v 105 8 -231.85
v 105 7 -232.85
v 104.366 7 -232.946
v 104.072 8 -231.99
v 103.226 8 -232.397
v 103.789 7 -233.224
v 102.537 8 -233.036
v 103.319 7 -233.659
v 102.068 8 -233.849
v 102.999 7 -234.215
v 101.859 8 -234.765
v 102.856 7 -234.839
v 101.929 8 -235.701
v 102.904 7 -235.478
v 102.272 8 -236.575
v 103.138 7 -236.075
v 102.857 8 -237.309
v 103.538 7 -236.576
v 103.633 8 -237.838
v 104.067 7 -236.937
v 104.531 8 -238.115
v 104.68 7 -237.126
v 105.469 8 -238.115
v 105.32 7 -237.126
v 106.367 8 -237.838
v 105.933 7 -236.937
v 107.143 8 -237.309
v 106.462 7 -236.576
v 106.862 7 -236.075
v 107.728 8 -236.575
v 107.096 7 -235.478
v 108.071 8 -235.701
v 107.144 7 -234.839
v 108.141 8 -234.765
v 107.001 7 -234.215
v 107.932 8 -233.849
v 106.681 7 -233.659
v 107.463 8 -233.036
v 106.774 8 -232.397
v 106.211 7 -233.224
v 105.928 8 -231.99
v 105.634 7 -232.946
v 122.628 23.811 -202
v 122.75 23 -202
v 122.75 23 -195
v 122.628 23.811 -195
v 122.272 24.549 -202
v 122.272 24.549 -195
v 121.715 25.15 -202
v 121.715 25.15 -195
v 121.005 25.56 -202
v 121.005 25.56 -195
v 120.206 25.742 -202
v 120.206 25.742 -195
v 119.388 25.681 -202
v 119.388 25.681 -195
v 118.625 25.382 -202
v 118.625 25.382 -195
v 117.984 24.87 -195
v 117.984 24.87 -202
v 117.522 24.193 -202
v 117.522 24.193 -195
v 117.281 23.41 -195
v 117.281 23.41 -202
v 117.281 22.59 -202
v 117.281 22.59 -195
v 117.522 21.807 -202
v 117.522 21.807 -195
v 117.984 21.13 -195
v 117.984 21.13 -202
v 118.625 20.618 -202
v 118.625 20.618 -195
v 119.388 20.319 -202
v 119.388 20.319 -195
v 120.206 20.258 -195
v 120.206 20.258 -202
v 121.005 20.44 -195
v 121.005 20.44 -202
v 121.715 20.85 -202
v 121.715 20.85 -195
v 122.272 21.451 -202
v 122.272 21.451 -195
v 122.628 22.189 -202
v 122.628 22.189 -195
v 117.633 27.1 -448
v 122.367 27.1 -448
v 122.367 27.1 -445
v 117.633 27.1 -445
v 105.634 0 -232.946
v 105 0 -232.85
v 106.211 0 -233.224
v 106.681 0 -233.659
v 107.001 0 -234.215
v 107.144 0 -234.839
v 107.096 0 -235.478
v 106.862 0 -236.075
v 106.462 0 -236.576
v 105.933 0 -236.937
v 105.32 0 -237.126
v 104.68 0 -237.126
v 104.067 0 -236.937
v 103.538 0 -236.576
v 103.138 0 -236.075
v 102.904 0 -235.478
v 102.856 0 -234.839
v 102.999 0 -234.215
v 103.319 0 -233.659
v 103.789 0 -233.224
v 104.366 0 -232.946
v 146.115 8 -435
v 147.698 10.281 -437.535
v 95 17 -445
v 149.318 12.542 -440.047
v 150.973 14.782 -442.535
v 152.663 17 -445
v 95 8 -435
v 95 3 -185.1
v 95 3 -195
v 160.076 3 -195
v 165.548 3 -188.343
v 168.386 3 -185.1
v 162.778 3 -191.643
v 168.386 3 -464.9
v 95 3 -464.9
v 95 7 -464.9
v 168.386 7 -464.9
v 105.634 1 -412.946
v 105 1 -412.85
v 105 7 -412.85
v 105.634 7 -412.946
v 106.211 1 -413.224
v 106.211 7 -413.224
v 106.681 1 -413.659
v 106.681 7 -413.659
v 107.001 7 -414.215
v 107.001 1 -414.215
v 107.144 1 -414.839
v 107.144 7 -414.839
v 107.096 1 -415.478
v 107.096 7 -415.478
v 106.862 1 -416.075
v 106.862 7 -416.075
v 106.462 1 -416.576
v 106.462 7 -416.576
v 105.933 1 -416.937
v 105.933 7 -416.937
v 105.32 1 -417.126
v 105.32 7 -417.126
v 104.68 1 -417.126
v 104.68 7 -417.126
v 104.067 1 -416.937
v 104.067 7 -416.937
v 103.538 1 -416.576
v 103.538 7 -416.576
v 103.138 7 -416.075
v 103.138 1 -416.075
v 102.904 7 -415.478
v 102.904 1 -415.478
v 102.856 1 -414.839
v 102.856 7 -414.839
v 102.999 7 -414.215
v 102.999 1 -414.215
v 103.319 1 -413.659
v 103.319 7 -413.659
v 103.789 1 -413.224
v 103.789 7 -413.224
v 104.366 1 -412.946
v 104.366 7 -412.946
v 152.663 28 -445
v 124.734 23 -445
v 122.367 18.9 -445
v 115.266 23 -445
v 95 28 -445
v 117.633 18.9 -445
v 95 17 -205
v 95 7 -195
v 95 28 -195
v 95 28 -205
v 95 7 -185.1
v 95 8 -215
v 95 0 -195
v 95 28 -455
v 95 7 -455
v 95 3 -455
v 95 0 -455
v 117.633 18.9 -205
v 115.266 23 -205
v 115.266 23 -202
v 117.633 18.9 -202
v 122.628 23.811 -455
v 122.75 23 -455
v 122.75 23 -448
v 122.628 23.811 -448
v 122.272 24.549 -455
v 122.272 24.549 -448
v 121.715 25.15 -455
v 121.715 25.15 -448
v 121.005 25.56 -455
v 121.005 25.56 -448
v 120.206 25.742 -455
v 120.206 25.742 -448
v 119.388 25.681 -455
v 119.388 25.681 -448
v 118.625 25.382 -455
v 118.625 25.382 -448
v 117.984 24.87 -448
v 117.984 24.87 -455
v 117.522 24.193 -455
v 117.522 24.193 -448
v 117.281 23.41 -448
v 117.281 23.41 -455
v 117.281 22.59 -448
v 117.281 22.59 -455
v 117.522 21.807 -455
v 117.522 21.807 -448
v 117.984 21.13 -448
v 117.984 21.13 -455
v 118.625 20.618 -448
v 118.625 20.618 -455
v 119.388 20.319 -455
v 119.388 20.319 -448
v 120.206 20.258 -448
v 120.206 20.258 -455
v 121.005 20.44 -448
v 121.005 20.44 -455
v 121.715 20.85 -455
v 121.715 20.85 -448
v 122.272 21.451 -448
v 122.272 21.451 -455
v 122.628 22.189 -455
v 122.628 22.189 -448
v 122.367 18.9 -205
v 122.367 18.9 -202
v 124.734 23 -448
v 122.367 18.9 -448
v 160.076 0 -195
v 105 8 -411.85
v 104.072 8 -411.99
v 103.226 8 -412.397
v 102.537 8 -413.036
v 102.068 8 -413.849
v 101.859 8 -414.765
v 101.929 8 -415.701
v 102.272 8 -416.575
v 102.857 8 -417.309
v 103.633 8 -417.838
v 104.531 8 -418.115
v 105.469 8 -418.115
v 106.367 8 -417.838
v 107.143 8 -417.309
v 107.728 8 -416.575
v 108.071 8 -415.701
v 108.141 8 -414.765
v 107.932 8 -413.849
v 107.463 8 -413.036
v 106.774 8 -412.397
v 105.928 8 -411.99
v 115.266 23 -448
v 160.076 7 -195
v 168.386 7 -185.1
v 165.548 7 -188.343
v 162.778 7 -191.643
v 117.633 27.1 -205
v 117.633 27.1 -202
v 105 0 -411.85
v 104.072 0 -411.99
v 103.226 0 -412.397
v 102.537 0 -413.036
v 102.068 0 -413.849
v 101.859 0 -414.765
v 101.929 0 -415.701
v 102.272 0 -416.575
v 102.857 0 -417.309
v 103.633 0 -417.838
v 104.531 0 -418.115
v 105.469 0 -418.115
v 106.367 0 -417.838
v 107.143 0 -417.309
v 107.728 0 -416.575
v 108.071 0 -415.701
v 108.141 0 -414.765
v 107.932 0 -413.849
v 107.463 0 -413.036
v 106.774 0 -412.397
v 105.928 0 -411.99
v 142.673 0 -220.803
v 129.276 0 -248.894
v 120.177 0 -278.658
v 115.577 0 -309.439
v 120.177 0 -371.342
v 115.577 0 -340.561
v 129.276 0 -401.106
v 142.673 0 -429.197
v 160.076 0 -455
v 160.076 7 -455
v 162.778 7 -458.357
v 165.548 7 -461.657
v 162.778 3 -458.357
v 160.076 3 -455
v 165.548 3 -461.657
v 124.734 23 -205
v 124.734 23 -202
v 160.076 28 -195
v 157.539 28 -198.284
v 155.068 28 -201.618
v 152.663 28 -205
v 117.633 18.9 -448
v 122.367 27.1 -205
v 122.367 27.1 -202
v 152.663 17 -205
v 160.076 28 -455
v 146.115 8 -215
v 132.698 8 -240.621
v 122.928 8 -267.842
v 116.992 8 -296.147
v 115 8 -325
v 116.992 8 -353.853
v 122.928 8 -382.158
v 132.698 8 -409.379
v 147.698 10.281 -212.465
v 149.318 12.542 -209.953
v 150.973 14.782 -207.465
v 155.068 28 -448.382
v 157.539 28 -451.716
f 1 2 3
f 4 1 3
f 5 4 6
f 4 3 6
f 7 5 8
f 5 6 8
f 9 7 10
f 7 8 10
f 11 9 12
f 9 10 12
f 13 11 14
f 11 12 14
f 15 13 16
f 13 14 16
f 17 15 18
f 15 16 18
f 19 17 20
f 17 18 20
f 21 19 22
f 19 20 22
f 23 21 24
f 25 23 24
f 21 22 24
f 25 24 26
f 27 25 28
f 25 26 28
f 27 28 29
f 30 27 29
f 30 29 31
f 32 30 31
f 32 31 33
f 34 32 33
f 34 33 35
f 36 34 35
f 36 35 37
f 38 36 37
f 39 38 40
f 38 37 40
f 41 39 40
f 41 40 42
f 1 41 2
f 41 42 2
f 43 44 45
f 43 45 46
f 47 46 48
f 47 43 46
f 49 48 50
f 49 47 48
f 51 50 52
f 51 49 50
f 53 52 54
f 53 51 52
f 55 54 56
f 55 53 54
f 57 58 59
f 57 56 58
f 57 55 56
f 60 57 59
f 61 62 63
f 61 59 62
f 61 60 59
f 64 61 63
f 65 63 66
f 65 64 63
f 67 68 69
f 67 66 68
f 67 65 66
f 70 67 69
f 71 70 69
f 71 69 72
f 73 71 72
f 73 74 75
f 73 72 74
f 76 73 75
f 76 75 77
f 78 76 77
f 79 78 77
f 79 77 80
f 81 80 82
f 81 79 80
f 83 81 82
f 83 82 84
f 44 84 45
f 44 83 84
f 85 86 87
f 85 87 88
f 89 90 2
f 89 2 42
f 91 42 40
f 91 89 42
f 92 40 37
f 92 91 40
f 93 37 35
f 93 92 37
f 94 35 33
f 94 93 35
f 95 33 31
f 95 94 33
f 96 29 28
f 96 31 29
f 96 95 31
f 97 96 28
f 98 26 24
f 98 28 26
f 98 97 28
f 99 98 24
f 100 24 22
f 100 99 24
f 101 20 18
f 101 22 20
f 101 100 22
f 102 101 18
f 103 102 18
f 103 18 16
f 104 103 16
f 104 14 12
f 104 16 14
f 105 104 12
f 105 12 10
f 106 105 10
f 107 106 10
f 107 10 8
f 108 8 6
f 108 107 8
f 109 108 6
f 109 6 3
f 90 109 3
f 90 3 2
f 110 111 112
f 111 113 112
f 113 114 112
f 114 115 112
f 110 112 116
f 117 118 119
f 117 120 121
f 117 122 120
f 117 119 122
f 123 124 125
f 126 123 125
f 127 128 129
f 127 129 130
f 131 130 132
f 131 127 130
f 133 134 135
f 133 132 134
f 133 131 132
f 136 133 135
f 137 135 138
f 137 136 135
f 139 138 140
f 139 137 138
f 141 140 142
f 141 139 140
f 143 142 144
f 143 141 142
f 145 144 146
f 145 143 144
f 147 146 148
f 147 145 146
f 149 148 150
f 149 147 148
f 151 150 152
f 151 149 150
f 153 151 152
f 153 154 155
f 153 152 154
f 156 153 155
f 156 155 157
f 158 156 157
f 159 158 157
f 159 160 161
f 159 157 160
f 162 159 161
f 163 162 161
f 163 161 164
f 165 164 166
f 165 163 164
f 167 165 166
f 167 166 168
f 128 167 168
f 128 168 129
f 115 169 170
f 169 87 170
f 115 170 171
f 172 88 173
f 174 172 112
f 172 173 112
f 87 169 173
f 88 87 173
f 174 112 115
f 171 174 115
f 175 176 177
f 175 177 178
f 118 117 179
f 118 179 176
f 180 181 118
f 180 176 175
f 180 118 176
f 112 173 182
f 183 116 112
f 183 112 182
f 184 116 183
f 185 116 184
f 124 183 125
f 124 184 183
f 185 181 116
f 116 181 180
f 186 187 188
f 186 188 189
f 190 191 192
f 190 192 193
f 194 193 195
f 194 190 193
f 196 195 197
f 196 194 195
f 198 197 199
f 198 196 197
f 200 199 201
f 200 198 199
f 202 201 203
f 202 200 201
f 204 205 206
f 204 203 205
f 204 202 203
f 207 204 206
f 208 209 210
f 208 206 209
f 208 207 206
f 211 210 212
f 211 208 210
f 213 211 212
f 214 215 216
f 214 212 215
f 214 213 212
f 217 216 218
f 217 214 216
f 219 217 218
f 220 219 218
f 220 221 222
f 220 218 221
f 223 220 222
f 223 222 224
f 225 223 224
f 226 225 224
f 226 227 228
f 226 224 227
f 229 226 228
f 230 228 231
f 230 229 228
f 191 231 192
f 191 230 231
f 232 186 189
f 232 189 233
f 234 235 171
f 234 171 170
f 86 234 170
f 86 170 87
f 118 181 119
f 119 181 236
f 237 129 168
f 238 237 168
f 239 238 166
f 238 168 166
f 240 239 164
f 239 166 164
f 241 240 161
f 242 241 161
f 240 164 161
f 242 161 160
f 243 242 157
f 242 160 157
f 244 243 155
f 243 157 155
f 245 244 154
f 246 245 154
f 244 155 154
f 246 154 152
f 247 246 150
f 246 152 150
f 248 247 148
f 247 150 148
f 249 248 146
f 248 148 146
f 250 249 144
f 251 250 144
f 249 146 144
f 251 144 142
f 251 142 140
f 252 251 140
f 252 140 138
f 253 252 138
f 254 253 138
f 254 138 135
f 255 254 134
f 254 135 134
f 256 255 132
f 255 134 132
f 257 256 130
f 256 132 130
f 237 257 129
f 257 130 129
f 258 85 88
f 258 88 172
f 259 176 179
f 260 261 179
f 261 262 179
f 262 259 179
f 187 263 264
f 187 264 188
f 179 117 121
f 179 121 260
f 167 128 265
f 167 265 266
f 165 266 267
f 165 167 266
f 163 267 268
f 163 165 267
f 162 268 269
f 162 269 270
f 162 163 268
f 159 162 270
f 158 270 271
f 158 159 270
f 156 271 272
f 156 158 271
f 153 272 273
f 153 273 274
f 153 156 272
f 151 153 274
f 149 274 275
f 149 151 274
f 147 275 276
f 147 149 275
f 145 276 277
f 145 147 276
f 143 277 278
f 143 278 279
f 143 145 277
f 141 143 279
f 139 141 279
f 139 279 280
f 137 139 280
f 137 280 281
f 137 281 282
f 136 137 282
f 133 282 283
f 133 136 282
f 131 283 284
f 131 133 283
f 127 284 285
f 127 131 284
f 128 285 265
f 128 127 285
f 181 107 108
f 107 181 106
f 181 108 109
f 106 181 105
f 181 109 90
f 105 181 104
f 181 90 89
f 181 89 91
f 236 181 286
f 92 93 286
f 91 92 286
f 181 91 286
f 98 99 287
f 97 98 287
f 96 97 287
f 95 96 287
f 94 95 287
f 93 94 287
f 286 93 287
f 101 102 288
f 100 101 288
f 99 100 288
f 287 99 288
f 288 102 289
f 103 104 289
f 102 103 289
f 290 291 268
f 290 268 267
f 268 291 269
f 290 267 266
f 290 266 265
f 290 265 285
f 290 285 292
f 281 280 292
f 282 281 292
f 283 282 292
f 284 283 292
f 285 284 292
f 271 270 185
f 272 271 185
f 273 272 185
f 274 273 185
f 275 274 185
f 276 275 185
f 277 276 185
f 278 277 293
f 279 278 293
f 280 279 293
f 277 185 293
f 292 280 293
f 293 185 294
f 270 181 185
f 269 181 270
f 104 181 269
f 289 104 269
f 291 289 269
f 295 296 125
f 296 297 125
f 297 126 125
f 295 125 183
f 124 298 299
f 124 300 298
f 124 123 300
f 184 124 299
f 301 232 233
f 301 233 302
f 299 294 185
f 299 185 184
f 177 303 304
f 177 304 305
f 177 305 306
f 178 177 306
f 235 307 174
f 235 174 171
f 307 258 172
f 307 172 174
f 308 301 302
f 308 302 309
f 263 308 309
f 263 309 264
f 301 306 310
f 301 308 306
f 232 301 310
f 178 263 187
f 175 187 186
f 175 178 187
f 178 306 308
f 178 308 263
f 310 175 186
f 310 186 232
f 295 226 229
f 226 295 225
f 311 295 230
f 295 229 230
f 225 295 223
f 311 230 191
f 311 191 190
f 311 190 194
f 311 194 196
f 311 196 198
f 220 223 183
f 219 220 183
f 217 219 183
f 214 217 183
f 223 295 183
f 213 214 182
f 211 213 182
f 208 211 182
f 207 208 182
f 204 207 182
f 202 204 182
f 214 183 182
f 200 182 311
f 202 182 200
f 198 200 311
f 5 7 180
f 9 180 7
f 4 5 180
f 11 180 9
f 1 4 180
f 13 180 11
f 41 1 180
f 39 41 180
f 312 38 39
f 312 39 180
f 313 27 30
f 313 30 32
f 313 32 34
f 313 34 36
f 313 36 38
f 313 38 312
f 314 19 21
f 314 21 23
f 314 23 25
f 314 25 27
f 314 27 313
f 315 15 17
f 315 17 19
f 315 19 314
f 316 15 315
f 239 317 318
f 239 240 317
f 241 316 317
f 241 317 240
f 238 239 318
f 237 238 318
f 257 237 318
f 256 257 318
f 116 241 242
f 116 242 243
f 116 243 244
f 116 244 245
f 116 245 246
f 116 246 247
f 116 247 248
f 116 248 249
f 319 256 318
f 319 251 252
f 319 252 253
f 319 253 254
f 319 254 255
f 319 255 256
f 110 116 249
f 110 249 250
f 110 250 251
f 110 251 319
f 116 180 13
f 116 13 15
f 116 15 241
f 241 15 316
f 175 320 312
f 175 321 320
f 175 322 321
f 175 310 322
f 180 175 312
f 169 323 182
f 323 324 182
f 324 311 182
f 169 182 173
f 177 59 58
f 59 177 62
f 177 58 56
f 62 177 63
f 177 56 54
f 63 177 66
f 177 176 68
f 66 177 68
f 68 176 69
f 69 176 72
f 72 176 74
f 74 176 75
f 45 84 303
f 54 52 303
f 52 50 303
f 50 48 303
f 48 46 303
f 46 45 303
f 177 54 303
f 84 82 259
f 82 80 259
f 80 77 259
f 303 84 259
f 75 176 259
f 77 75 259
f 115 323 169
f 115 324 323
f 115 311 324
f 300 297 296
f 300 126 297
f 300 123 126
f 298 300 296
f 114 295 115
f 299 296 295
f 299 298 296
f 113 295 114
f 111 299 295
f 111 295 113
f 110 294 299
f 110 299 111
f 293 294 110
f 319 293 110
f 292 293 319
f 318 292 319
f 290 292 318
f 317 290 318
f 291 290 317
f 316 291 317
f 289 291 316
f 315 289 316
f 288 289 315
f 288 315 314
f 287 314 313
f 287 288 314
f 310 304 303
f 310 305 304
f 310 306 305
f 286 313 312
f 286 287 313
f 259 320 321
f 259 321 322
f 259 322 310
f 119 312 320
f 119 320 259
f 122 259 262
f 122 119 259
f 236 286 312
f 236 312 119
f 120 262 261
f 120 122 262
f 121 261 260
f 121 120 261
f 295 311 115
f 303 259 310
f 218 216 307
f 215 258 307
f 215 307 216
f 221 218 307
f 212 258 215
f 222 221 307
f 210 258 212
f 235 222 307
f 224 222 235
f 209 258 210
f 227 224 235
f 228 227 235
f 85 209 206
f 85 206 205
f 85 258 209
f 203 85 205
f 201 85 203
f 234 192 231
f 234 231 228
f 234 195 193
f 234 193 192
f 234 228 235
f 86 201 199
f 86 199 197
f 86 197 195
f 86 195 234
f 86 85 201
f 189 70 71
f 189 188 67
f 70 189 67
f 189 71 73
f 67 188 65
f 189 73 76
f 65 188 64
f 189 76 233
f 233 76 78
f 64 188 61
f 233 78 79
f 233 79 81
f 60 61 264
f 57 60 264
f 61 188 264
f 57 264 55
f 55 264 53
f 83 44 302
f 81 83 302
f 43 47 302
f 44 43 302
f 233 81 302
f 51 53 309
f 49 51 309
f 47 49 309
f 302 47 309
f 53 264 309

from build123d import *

# Parameters (mm, degrees)
SKETCH1_W                = 650
SKETCH1_H                = 650
BOSS_EXTRUDE1_DEPTH      = 8
BOSS_EXTRUDE2_DEPTH      = 650
CUT_EXTRUDE2_DEPTH       = 921.277302922
CUT_EXTRUDE2_DEPTH_BACK  = 921.277302922
SKETCH4_R                = 11
CUT_EXTRUDE1_DEPTH       = 920.932062709
CUT_EXTRUDE1_DEPTH_BACK  = 920.932062709
SKETCH2_R                = 210
CUT_EXTRUDE3_DEPTH       = 921.277302998
CUT_EXTRUDE3_DEPTH_BACK  = 110
CUT_EXTRUDE4_DEPTH       = 110
CUT_EXTRUDE5_DEPTH       = 920.932062713
CUT_EXTRUDE5_DEPTH_BACK  = 920.932062713
SKETCH7_OUTSIDE_W        = 836.056
SKETCH7_OUTSIDE_H        = 836.056
BOSS_EXTRUDE3_DEPTH      = 170
SKETCH11_W               = 9.9
SKETCH11_H               = 4
BOSS_EXTRUDE4_DEPTH      = 170
CUT_EXTRUDE7_DEPTH       = 496.410950626
CUT_EXTRUDE7_DEPTH_BACK  = 496.410950626
SKETCH10_R               = 210
CUT_EXTRUDE8_DEPTH       = 320.349035711
CUT_EXTRUDE8_DEPTH_BACK  = 320.349035711
SKETCH12_R               = 2.75
SKETCH12_R_2             = 2.2
CUT_EXTRUDE9_DEPTH       = 495.859380642
CUT_EXTRUDE9_DEPTH_BACK  = 495.859380642
SKETCH13_W               = 95
SKETCH13_H               = 279.8
CUT_EXTRUDE10_DEPTH      = 495.859380642
CUT_EXTRUDE10_DEPTH_BACK = 495.859380642
SKETCH14_R               = 2.15
CHAMFER1_SIZE            = 1
CUT_EXTRUDE11_DEPTH      = 3
LPATTERN1_COUNT          = 2
LPATTERN1_PITCH          = 243


with BuildPart() as part:
    # Sketch1 → Boss-Extrude1 (new body)
    with BuildSketch(Plane(origin=(0, 0, 0), x_dir=(1, 0, 0), z_dir=(0, 1, 0))):
        with Locations((325, 325)):
            Rectangle(SKETCH1_W, SKETCH1_H)
    extrude(amount=BOSS_EXTRUDE1_DEPTH)

    # Sketch3 → Boss-Extrude2 (add)
    with BuildSketch(Plane.XY):
        Polygon((300, 43.707142143), (350, 43.707142143), (385, 8), (265, 8), align=None)
    extrude(amount=-BOSS_EXTRUDE2_DEPTH)

    # Sketch4 → Cut-Extrude2 (cut, two sides: drawn at the far end of the back side and taken through both)
    with BuildSketch(Plane.XY.offset(-CUT_EXTRUDE2_DEPTH_BACK)):
        with Locations((325, 22)):
            Circle(SKETCH4_R)
    extrude(amount=CUT_EXTRUDE2_DEPTH + CUT_EXTRUDE2_DEPTH_BACK, mode=Mode.SUBTRACT)

    # Sketch2 → Cut-Extrude1 (cut, two sides: drawn at the far end of the back side and taken through both)
    with BuildSketch(Plane(origin=(0, 8, 0), x_dir=(1, 0, 0), z_dir=(0, 1, 0)).offset(-CUT_EXTRUDE1_DEPTH_BACK)):
        with Locations(Location((325, 325, 0), (0, 0, 270))):
            Circle(SKETCH2_R)
    extrude(amount=CUT_EXTRUDE1_DEPTH + CUT_EXTRUDE1_DEPTH_BACK, mode=Mode.SUBTRACT)

    # Sketch5 → Cut-Extrude3 (cut, two sides: drawn at the far end of the back side and taken through both)
    with BuildSketch(Plane.XY.offset(-CUT_EXTRUDE3_DEPTH_BACK)):
        Polygon((300, 43.707142143), (350, 43.707142143), (365.396078824, 28), (350, 28), (350, 8), (300, 8), (300, 28), (284.603921176, 28), align=None)
    extrude(amount=CUT_EXTRUDE3_DEPTH + CUT_EXTRUDE3_DEPTH_BACK, mode=Mode.SUBTRACT)

    # Sketch6 → Cut-Extrude4 (cut)
    with BuildSketch(Plane(origin=(0, 0, -650), x_dir=(-1, 0, 0), z_dir=(0, 0, -1))):
        Polygon((-350, 43.707142143), (-300, 43.707142143), (-284.603921176, 28), (-300, 28), (-300, 8), (-350, 8), (-350, 28), (-365.396078824, 28), align=None)
    extrude(amount=-CUT_EXTRUDE4_DEPTH, mode=Mode.SUBTRACT)

    # Sketch7 outside → Cut-Extrude5 (cut, two sides: drawn at the far end of the back side and taken through both)
    with BuildSketch(Plane(origin=(0, 8, 0), x_dir=(1, 0, 0), z_dir=(0, 1, 0)).offset(-CUT_EXTRUDE5_DEPTH_BACK)):
        with Locations((325, 325)):
            Rectangle(SKETCH7_OUTSIDE_W, SKETCH7_OUTSIDE_H)
        Polygon((195, 455), (-124.314954955, 455), (-40.613333333, 195), (195, 195), align=None, mode=Mode.SUBTRACT)
    extrude(amount=CUT_EXTRUDE5_DEPTH + CUT_EXTRUDE5_DEPTH_BACK, mode=Mode.SUBTRACT)

    # Sketch8 → Boss-Extrude3 (add)
    with BuildSketch(Plane.ZY):
        Polygon((-455, 8), (-455, 28), (-445, 28), (-445, 17), (-435, 8), align=None)
        Polygon((-195, 8), (-195, 28), (-205, 28), (-205, 17), (-215, 8), align=None)
    extrude(amount=-BOSS_EXTRUDE3_DEPTH)

    # Sketch11 → Boss-Extrude4 (add)
    with BuildSketch(Plane.ZY):
        with Locations((-459.95, 5)):
            Rectangle(SKETCH11_W, SKETCH11_H)
        with Locations((-190.05, 5)):
            Rectangle(SKETCH11_W, SKETCH11_H)
    extrude(amount=-BOSS_EXTRUDE4_DEPTH)

    # Sketch10 → Cut-Extrude7 (cut, two sides: drawn at the far end of the back side and taken through both)
    with BuildSketch(Plane(origin=(0, 8, 0), x_dir=(1, 0, 0), z_dir=(0, 1, 0)).offset(-CUT_EXTRUDE7_DEPTH_BACK)):
        with Locations((325, 325)):
            Circle(SKETCH10_R)
    extrude(amount=CUT_EXTRUDE7_DEPTH + CUT_EXTRUDE7_DEPTH_BACK, mode=Mode.SUBTRACT)

    # Sketch12 → Cut-Extrude8 (cut, two sides: drawn at the far end of the back side and taken through both)
    with BuildSketch(Plane.XY.offset(-195).offset(-CUT_EXTRUDE8_DEPTH_BACK)):
        with Locations((40, 23)):
            Circle(SKETCH12_R)
        with Locations((80, 23)):
            Circle(SKETCH12_R_2)
        with Locations((120, 23)):
            Circle(SKETCH12_R)
    extrude(amount=CUT_EXTRUDE8_DEPTH + CUT_EXTRUDE8_DEPTH_BACK, mode=Mode.SUBTRACT)

    # Sketch13 → Cut-Extrude9 (cut, two sides: drawn at the far end of the back side and taken through both)
    with BuildSketch(Plane(origin=(0, 8, 0), x_dir=(1, 0, 0), z_dir=(0, 1, 0)).offset(-CUT_EXTRUDE9_DEPTH_BACK)):
        with Locations((47.5, 325)):
            Rectangle(SKETCH13_W, SKETCH13_H)
    extrude(amount=CUT_EXTRUDE9_DEPTH + CUT_EXTRUDE9_DEPTH_BACK, mode=Mode.SUBTRACT)

    # Sketch14 → Cut-Extrude10 (cut, two sides: drawn at the far end of the back side and taken through both)
    with BuildSketch(Plane(origin=(0, 8, 0), x_dir=(1, 0, 0), z_dir=(0, 1, 0)).offset(-CUT_EXTRUDE10_DEPTH_BACK)):
        with Locations(Location((105, 235, 0), (0, 0, 270))):
            Circle(SKETCH14_R)
        with Locations(Location((105, 415, 0), (0, 0, 270))):
            Circle(SKETCH14_R)
    extrude(amount=CUT_EXTRUDE10_DEPTH + CUT_EXTRUDE10_DEPTH_BACK, mode=Mode.SUBTRACT)

    # Chamfer1
    chamfer1_edges = [part.edges().sort_by_distance(p)[0] for p in [
        (105, 8, -237.15),
        (105, 0, -417.15),
        (105, 8, -417.15),
    ]]
    chamfer(chamfer1_edges, length=CHAMFER1_SIZE)

    # Sketch15 → Cut-Extrude11 (cut)
    with BuildSketch(Plane(origin=(0, 0, -205), x_dir=(-1, 0, 0), z_dir=(0, 0, -1))):
        Polygon((-122.367136104, 27.1), (-117.632863896, 27.1), (-115.265727793, 23), (-117.632863896, 18.9), (-122.367136104, 18.9), (-124.734272207, 23), align=None)
    cut_extrude11 = extrude(amount=-CUT_EXTRUDE11_DEPTH, mode=Mode.SUBTRACT)

    # LPattern1: Cut-Extrude11 ×2
    with Locations(*[(0, 0, -i * LPATTERN1_PITCH) for i in range(1, LPATTERN1_COUNT)]):
        add(cut_extrude11, mode=Mode.SUBTRACT)


solid = part.part
